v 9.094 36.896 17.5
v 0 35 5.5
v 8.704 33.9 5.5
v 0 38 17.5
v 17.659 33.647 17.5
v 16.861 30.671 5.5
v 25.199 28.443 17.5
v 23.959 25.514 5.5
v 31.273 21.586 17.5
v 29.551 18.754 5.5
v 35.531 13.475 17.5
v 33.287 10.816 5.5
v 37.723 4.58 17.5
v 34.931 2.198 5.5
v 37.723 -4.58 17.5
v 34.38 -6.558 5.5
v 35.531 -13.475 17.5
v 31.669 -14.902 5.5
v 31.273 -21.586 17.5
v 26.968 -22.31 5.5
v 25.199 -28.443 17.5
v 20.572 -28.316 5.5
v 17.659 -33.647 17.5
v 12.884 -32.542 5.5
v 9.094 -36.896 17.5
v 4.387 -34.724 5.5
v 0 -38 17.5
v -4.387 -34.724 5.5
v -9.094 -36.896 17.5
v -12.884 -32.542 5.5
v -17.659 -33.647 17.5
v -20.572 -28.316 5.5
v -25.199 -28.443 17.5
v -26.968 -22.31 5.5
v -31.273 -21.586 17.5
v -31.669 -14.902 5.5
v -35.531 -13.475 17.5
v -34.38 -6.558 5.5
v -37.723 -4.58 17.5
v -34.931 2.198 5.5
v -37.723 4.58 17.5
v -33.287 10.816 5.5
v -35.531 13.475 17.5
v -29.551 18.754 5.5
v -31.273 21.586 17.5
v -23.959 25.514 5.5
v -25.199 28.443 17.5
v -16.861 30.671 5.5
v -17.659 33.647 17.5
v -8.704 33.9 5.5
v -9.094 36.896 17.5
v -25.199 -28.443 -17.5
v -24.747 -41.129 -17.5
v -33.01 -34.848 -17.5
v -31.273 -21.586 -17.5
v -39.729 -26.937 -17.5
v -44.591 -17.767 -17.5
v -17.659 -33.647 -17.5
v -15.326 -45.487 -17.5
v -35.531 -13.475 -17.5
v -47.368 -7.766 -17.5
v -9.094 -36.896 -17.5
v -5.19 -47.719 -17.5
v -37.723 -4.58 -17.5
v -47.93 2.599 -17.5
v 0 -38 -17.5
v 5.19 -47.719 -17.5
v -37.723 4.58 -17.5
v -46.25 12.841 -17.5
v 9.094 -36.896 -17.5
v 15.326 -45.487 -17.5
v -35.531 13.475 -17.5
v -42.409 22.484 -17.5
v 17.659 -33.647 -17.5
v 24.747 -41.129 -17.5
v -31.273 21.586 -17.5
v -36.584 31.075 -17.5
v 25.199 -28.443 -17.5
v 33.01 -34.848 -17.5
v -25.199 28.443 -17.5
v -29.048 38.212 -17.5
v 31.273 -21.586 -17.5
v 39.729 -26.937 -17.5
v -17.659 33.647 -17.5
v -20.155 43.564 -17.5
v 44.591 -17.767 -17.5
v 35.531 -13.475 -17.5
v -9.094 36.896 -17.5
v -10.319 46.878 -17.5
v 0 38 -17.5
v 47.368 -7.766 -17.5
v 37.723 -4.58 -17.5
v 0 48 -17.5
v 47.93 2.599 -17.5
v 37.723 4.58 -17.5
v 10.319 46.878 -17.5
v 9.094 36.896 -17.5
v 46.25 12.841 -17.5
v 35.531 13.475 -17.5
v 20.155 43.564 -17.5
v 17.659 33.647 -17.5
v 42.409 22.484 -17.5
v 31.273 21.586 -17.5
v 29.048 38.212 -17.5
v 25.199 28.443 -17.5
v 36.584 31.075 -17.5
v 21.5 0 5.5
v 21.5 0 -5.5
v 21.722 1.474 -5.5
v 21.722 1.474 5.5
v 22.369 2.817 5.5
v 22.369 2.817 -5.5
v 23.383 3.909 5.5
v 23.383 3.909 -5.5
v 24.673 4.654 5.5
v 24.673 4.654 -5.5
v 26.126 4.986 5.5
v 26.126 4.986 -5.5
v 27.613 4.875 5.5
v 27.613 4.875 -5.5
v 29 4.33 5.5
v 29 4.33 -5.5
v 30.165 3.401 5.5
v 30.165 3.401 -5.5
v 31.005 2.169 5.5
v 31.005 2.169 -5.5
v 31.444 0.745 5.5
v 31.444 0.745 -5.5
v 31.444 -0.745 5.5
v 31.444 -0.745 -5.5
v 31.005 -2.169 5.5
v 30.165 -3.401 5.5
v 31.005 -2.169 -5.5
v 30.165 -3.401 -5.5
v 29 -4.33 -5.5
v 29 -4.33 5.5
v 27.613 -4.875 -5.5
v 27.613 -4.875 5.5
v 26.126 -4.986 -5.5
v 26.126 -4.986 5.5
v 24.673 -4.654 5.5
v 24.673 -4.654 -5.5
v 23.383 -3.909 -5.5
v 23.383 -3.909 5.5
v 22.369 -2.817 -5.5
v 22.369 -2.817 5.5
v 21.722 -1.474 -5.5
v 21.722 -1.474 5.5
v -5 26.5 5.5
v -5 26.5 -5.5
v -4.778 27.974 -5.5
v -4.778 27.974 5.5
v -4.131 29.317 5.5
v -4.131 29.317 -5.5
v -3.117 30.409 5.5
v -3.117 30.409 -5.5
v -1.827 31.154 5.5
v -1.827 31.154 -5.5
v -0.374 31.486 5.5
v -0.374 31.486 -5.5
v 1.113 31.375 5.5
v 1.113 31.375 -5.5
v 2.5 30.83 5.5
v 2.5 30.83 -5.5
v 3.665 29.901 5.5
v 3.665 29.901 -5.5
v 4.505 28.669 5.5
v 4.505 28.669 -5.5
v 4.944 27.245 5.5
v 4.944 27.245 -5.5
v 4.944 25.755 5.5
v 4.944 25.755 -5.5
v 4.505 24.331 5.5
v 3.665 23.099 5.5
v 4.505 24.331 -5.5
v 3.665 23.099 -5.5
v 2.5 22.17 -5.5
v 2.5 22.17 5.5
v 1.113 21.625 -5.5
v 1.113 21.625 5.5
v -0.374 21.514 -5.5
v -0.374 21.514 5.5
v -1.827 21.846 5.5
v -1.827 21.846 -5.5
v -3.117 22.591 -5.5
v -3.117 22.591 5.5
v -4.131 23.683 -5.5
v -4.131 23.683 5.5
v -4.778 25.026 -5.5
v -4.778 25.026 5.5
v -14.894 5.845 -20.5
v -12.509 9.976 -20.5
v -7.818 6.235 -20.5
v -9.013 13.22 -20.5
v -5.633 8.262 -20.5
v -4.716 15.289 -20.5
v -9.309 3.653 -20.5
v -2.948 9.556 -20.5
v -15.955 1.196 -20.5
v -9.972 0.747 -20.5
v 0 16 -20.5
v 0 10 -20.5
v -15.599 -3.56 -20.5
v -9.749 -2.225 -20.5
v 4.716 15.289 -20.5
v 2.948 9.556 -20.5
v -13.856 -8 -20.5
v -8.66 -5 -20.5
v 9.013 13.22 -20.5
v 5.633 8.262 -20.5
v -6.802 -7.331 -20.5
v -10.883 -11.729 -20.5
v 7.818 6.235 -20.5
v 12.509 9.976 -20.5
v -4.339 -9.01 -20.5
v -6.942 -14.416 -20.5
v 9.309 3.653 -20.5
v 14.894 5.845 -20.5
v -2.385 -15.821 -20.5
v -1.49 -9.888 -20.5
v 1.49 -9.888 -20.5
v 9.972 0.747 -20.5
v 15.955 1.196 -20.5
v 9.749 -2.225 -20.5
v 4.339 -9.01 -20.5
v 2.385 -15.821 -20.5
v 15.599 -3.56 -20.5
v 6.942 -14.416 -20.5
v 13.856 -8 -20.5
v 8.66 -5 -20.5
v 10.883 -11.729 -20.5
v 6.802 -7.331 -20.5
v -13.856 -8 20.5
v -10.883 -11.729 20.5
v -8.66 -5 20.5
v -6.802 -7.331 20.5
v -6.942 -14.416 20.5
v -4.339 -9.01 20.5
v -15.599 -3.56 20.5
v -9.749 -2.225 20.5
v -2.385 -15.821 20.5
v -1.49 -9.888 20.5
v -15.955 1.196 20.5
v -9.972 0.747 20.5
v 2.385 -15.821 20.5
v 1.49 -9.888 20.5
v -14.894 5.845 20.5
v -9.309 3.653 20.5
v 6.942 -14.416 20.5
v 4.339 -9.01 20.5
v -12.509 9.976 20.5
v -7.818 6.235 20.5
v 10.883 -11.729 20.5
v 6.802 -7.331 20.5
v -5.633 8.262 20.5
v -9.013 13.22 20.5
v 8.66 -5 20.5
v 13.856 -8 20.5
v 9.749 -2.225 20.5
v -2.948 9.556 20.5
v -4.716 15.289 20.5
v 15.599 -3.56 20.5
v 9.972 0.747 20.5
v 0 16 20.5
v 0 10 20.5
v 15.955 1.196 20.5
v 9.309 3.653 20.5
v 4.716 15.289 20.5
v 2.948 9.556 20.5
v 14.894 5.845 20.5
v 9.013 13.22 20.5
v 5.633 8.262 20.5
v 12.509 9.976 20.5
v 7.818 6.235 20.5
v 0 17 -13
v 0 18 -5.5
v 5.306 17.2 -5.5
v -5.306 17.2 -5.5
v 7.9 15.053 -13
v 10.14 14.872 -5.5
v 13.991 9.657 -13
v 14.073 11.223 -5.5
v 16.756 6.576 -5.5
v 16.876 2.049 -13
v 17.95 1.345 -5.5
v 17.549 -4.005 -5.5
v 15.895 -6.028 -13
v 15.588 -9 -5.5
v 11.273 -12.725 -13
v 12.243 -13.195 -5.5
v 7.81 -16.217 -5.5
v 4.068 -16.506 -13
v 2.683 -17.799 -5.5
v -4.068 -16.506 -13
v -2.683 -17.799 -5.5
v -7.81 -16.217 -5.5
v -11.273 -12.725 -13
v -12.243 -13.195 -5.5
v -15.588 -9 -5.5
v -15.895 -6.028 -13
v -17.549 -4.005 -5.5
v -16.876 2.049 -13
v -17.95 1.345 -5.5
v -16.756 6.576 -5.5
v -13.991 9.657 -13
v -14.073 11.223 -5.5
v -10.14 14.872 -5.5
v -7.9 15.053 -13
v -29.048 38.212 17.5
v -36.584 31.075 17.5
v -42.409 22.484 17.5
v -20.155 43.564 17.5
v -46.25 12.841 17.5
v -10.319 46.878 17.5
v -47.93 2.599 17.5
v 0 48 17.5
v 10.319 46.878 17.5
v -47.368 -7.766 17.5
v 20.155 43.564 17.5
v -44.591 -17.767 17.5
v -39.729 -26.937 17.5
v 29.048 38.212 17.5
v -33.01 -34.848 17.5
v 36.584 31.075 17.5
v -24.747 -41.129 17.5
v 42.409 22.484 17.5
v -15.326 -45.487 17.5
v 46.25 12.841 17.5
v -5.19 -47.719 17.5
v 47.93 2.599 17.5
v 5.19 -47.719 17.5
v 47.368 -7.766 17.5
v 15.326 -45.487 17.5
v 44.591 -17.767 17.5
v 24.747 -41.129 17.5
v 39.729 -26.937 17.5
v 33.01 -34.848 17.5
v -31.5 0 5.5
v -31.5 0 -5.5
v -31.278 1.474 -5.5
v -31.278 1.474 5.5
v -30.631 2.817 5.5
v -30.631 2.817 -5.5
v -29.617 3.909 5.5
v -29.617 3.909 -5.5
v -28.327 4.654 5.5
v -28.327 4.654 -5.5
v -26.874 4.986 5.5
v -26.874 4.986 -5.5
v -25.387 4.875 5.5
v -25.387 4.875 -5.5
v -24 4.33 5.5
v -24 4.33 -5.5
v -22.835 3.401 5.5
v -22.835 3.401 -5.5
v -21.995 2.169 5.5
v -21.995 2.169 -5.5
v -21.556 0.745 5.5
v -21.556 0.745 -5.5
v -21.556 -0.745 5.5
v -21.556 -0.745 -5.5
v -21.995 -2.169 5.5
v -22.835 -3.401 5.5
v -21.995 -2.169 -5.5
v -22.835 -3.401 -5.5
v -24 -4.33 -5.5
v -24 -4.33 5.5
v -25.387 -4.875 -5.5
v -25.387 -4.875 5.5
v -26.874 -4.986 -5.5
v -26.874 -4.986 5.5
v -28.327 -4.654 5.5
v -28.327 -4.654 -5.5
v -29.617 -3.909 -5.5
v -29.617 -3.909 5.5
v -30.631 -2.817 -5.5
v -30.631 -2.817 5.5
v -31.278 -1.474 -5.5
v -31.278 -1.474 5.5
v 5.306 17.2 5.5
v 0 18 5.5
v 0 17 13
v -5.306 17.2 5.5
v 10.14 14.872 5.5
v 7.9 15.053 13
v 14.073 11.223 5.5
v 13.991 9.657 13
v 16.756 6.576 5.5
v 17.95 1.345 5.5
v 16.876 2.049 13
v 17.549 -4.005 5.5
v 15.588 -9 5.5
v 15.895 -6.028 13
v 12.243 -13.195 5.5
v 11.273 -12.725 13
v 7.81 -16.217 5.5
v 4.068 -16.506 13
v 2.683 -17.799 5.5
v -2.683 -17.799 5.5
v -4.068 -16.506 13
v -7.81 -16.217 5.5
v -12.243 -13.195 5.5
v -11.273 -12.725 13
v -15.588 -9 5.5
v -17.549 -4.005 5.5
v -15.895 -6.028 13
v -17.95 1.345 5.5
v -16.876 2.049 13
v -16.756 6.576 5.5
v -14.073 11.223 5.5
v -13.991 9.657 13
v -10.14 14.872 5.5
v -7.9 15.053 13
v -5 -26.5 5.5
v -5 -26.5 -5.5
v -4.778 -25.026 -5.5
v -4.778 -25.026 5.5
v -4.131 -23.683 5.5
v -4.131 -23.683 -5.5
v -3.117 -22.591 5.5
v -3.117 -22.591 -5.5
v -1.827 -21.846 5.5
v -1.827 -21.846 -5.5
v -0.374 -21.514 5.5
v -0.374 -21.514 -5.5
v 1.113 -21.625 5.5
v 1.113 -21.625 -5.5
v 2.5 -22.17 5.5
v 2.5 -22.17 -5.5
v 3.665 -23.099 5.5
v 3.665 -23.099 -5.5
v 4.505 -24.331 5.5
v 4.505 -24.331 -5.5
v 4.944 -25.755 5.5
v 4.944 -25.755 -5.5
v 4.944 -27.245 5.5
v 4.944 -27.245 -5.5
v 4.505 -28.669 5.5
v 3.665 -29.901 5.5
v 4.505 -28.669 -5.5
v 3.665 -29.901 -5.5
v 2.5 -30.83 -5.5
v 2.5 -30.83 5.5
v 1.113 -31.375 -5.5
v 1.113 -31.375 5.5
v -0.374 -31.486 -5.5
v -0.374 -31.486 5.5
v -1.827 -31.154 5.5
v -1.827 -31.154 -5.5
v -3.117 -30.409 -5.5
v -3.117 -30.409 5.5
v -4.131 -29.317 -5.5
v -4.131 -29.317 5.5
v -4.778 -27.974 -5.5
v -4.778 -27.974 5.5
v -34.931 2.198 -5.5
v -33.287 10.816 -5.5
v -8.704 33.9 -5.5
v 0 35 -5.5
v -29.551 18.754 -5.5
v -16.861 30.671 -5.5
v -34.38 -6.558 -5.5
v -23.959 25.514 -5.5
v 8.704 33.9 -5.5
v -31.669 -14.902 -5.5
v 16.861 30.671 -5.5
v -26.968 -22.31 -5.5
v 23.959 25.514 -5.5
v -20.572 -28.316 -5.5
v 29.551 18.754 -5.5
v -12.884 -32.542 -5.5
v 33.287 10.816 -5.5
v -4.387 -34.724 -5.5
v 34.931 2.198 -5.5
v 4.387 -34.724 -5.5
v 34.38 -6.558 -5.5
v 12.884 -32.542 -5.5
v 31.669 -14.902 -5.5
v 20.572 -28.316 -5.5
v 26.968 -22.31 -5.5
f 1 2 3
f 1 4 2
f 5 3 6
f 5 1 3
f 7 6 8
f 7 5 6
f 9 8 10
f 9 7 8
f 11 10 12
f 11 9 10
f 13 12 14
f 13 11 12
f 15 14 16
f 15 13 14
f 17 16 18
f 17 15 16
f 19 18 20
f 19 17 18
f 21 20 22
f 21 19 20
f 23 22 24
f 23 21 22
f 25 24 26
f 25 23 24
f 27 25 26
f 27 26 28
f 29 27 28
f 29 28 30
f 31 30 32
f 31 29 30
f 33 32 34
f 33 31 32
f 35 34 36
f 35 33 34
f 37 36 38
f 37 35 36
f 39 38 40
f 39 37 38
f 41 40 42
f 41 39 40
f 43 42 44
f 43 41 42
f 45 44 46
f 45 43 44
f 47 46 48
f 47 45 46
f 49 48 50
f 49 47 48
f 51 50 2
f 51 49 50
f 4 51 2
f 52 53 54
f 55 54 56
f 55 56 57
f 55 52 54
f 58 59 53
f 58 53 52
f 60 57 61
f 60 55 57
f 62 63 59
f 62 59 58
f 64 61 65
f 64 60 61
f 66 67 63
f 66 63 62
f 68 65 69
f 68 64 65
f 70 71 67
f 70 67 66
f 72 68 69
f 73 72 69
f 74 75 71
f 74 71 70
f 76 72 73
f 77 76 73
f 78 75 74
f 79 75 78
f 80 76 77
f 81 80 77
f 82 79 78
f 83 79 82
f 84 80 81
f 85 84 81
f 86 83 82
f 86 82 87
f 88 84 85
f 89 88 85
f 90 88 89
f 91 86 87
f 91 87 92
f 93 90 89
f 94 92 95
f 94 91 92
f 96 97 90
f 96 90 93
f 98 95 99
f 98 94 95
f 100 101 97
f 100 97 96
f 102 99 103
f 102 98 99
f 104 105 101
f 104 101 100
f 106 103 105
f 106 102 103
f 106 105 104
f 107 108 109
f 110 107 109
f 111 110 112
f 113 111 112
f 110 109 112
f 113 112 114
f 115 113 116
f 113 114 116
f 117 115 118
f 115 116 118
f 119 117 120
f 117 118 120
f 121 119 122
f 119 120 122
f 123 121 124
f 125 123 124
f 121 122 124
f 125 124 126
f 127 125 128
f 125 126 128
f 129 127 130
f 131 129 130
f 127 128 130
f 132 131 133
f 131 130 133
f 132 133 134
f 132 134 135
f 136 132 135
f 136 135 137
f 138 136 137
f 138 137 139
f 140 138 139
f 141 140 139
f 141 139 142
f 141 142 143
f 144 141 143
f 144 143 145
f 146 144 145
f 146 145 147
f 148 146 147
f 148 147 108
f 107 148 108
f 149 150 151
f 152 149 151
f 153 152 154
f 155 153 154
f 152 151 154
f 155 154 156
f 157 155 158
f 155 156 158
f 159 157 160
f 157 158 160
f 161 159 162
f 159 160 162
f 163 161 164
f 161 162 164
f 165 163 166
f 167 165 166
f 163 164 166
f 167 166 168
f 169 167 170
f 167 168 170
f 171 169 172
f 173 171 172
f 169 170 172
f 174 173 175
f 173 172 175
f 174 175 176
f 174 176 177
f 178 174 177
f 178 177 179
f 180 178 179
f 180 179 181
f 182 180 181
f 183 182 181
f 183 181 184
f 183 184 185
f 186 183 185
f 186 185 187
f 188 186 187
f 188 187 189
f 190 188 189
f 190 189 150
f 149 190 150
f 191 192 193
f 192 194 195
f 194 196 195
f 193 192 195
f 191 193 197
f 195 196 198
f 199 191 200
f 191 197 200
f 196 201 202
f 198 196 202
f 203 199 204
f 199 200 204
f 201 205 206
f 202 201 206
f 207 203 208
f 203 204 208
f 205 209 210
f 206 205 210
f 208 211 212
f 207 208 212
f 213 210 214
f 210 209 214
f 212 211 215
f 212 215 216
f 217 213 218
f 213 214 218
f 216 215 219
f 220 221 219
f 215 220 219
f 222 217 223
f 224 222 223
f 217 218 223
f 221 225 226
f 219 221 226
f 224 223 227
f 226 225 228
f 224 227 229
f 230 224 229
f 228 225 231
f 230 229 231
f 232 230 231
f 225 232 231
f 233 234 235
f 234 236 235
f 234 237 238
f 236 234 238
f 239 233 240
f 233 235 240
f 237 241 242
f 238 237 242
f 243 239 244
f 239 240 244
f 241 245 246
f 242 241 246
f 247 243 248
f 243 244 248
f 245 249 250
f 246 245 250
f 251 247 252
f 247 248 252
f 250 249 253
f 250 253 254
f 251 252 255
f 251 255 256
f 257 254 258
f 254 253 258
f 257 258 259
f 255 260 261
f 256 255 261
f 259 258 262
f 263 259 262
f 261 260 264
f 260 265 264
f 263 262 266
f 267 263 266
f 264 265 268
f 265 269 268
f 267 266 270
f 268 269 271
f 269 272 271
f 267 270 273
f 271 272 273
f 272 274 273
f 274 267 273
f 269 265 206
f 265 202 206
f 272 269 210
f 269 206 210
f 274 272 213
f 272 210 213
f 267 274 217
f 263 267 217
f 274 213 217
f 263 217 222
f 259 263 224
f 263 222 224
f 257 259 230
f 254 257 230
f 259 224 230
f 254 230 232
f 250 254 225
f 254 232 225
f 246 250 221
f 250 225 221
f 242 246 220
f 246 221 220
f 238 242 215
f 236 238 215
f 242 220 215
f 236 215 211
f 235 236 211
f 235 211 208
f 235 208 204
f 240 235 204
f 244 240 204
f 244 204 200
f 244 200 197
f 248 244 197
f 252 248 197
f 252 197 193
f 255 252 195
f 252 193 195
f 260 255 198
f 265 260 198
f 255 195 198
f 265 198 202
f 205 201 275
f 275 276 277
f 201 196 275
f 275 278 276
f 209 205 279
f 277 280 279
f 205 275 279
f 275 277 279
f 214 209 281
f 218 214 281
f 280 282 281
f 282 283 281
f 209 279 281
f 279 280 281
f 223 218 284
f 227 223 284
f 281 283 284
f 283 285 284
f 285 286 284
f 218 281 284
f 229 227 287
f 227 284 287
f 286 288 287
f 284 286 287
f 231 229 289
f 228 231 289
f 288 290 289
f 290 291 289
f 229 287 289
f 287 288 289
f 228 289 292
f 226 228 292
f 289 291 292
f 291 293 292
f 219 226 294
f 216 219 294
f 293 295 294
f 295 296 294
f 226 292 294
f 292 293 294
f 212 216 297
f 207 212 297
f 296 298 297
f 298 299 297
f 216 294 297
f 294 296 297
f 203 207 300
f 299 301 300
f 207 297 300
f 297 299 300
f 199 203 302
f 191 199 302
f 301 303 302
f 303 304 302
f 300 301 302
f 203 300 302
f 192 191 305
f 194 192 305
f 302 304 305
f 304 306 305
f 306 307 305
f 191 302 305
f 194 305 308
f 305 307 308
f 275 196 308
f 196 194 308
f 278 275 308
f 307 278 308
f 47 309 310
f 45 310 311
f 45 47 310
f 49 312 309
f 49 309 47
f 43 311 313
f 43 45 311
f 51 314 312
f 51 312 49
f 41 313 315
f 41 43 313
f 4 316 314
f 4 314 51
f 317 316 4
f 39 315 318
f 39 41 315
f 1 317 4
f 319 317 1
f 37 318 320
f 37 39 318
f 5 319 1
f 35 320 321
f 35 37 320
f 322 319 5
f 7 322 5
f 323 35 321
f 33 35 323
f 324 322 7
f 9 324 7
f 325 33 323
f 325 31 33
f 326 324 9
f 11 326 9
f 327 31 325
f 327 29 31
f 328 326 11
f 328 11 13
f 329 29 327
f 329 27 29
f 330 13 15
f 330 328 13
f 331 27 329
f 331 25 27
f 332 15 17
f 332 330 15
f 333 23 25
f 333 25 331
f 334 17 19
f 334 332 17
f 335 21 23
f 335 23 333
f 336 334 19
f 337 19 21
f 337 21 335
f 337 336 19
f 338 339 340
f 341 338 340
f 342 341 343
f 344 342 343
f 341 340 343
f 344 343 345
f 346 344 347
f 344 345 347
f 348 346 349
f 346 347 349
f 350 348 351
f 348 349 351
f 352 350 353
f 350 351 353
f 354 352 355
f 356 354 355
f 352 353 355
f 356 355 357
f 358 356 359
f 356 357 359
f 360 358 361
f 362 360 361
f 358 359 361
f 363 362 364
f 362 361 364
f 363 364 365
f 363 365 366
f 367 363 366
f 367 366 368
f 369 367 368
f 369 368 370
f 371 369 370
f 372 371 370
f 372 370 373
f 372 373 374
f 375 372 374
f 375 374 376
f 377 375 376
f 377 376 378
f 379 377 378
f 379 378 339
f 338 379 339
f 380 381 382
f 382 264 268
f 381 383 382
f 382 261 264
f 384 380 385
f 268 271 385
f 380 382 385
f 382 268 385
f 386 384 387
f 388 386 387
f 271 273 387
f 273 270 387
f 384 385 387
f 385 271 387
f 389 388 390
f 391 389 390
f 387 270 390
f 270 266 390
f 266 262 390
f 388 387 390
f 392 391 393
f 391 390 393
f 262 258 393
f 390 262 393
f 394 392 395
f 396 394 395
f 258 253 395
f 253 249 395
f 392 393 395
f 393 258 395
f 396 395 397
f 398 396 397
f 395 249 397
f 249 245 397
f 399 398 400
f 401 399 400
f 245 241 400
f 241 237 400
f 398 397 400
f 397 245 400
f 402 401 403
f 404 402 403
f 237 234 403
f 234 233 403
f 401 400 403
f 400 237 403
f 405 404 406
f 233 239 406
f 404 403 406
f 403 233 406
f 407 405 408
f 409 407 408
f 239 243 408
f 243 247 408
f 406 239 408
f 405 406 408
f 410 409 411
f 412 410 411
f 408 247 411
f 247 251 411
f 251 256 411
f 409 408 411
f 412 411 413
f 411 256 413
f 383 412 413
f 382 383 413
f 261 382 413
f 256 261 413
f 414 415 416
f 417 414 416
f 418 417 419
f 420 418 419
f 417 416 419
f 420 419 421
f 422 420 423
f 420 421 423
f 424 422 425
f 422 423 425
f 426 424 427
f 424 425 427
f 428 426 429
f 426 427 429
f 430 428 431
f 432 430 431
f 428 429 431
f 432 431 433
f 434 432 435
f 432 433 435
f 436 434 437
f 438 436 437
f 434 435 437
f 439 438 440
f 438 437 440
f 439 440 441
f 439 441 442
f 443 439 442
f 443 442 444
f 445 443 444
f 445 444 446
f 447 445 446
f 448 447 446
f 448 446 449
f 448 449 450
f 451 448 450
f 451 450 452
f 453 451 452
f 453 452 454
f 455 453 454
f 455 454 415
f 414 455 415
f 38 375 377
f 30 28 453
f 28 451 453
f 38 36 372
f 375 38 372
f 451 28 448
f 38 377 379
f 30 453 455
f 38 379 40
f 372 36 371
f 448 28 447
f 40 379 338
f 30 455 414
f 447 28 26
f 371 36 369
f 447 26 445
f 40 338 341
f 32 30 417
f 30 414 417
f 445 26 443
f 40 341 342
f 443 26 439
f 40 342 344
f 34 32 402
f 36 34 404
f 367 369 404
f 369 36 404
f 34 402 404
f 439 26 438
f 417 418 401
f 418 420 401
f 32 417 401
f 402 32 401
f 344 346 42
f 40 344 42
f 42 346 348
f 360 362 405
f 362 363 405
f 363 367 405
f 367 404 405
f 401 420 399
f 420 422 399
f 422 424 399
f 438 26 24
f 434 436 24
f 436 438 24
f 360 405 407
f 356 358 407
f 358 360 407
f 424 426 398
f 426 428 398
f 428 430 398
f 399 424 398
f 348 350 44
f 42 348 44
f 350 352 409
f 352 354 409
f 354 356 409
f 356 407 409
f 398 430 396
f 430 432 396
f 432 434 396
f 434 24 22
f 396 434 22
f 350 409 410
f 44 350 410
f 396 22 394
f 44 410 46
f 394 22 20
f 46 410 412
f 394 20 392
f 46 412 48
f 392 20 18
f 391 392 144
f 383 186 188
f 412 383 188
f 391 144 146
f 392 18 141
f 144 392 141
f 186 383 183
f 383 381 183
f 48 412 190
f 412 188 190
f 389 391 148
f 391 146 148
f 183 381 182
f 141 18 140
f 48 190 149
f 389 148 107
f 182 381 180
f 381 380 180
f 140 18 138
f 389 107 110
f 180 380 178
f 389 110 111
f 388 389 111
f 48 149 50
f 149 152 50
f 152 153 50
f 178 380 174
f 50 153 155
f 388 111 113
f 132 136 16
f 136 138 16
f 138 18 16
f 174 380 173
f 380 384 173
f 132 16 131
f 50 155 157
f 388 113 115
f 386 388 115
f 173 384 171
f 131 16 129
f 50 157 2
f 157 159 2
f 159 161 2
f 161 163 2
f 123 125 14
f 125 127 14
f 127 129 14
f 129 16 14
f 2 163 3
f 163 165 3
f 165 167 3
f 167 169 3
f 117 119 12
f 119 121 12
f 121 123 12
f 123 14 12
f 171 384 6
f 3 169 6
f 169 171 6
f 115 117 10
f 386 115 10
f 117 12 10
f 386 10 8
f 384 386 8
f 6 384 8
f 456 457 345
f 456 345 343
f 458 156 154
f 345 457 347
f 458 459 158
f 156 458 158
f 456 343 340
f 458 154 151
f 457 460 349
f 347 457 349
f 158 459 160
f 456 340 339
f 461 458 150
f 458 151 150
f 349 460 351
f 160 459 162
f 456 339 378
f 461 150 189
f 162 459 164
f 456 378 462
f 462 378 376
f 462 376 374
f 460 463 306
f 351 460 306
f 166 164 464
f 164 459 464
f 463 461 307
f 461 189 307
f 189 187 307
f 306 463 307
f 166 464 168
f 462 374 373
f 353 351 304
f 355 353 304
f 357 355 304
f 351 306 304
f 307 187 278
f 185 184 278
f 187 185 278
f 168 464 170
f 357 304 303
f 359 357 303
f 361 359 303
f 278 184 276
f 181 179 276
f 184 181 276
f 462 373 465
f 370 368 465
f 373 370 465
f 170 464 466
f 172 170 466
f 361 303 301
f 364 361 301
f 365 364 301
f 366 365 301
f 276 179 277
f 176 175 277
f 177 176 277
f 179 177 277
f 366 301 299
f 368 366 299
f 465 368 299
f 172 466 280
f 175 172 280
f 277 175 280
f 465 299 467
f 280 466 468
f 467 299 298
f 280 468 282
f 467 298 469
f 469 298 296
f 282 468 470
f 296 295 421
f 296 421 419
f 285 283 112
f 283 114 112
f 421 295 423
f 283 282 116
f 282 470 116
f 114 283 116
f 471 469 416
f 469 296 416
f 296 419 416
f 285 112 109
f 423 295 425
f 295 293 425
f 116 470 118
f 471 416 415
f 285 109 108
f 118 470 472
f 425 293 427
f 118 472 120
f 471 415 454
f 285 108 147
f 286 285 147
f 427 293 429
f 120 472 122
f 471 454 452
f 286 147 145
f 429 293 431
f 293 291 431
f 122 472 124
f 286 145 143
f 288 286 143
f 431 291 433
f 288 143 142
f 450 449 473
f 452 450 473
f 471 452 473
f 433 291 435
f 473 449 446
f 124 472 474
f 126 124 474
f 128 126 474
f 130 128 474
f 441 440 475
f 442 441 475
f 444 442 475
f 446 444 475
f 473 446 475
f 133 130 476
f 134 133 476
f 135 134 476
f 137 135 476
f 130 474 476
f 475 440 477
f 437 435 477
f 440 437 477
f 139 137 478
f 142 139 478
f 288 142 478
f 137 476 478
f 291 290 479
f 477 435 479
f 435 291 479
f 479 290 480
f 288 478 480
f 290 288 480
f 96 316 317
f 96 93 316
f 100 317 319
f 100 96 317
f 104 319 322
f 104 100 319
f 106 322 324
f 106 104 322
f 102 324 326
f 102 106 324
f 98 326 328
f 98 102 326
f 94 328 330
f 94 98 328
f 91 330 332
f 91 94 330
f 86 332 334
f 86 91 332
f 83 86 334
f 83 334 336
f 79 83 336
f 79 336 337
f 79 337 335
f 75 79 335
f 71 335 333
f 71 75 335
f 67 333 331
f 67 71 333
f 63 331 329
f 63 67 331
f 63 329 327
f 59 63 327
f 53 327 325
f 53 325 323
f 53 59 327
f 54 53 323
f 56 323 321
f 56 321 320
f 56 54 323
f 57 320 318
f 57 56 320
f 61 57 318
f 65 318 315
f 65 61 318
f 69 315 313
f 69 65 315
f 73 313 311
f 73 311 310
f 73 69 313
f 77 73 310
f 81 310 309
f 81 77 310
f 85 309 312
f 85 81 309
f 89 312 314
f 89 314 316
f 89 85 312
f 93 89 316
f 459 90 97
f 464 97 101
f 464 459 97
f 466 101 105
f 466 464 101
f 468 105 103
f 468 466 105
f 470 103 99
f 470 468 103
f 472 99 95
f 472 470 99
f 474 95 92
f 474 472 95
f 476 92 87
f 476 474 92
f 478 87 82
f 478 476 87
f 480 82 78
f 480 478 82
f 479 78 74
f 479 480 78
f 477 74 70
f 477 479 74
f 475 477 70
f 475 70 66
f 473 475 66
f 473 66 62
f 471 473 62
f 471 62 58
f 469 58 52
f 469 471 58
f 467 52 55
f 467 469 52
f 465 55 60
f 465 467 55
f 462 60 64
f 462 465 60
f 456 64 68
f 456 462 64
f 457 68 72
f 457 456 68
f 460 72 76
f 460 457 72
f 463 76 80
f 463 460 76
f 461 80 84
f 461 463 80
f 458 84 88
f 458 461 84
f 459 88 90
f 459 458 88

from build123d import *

# Parameters (mm, degrees)
SKETCH2_R          = 5
CUT_EXTRUDE1_DEPTH = 27


with BuildPart() as part:
    # Sketch1 → Revolve1 (revolve)
    with BuildSketch(Plane(origin=(0, 0, 0), x_dir=(0, 0, -1), z_dir=(1, 0, 0))):
        Polygon((-17.5, 48), (17.5, 48), (17.5, 38), (5.5, 35), (-5.5, 35), (-17.5, 38), align=None)
        Polygon((-5.5, 18), (-5.5, 10), (5.5, 10), (5.5, 18), (5.5, 35), (-5.5, 35), align=None)
        Polygon((5.5, 18), (5.5, 10), (20.5, 10), (20.5, 16), align=None)
        Polygon((-20.5, 16), (-20.5, 10), (-5.5, 10), (-5.5, 18), align=None)
    revolve(axis=Axis((0, 0, 20.5), (0, 0, -1)))

    # Sketch2 → Cut-Extrude1 (cut, through all)
    with BuildSketch(Plane(origin=(0, 0, -5.5), x_dir=(-1, 0, 0), z_dir=(0, 0, -1))):
        with Locations((0, 26.5)):
            Circle(SKETCH2_R)
        with Locations((26.5, 0)):
            Circle(SKETCH2_R)
        with Locations((0, -26.5)):
            Circle(SKETCH2_R)
        with Locations((-26.5, 0)):
            Circle(SKETCH2_R)
    extrude(amount=-CUT_EXTRUDE1_DEPTH, mode=Mode.SUBTRACT)


solid = part.part
